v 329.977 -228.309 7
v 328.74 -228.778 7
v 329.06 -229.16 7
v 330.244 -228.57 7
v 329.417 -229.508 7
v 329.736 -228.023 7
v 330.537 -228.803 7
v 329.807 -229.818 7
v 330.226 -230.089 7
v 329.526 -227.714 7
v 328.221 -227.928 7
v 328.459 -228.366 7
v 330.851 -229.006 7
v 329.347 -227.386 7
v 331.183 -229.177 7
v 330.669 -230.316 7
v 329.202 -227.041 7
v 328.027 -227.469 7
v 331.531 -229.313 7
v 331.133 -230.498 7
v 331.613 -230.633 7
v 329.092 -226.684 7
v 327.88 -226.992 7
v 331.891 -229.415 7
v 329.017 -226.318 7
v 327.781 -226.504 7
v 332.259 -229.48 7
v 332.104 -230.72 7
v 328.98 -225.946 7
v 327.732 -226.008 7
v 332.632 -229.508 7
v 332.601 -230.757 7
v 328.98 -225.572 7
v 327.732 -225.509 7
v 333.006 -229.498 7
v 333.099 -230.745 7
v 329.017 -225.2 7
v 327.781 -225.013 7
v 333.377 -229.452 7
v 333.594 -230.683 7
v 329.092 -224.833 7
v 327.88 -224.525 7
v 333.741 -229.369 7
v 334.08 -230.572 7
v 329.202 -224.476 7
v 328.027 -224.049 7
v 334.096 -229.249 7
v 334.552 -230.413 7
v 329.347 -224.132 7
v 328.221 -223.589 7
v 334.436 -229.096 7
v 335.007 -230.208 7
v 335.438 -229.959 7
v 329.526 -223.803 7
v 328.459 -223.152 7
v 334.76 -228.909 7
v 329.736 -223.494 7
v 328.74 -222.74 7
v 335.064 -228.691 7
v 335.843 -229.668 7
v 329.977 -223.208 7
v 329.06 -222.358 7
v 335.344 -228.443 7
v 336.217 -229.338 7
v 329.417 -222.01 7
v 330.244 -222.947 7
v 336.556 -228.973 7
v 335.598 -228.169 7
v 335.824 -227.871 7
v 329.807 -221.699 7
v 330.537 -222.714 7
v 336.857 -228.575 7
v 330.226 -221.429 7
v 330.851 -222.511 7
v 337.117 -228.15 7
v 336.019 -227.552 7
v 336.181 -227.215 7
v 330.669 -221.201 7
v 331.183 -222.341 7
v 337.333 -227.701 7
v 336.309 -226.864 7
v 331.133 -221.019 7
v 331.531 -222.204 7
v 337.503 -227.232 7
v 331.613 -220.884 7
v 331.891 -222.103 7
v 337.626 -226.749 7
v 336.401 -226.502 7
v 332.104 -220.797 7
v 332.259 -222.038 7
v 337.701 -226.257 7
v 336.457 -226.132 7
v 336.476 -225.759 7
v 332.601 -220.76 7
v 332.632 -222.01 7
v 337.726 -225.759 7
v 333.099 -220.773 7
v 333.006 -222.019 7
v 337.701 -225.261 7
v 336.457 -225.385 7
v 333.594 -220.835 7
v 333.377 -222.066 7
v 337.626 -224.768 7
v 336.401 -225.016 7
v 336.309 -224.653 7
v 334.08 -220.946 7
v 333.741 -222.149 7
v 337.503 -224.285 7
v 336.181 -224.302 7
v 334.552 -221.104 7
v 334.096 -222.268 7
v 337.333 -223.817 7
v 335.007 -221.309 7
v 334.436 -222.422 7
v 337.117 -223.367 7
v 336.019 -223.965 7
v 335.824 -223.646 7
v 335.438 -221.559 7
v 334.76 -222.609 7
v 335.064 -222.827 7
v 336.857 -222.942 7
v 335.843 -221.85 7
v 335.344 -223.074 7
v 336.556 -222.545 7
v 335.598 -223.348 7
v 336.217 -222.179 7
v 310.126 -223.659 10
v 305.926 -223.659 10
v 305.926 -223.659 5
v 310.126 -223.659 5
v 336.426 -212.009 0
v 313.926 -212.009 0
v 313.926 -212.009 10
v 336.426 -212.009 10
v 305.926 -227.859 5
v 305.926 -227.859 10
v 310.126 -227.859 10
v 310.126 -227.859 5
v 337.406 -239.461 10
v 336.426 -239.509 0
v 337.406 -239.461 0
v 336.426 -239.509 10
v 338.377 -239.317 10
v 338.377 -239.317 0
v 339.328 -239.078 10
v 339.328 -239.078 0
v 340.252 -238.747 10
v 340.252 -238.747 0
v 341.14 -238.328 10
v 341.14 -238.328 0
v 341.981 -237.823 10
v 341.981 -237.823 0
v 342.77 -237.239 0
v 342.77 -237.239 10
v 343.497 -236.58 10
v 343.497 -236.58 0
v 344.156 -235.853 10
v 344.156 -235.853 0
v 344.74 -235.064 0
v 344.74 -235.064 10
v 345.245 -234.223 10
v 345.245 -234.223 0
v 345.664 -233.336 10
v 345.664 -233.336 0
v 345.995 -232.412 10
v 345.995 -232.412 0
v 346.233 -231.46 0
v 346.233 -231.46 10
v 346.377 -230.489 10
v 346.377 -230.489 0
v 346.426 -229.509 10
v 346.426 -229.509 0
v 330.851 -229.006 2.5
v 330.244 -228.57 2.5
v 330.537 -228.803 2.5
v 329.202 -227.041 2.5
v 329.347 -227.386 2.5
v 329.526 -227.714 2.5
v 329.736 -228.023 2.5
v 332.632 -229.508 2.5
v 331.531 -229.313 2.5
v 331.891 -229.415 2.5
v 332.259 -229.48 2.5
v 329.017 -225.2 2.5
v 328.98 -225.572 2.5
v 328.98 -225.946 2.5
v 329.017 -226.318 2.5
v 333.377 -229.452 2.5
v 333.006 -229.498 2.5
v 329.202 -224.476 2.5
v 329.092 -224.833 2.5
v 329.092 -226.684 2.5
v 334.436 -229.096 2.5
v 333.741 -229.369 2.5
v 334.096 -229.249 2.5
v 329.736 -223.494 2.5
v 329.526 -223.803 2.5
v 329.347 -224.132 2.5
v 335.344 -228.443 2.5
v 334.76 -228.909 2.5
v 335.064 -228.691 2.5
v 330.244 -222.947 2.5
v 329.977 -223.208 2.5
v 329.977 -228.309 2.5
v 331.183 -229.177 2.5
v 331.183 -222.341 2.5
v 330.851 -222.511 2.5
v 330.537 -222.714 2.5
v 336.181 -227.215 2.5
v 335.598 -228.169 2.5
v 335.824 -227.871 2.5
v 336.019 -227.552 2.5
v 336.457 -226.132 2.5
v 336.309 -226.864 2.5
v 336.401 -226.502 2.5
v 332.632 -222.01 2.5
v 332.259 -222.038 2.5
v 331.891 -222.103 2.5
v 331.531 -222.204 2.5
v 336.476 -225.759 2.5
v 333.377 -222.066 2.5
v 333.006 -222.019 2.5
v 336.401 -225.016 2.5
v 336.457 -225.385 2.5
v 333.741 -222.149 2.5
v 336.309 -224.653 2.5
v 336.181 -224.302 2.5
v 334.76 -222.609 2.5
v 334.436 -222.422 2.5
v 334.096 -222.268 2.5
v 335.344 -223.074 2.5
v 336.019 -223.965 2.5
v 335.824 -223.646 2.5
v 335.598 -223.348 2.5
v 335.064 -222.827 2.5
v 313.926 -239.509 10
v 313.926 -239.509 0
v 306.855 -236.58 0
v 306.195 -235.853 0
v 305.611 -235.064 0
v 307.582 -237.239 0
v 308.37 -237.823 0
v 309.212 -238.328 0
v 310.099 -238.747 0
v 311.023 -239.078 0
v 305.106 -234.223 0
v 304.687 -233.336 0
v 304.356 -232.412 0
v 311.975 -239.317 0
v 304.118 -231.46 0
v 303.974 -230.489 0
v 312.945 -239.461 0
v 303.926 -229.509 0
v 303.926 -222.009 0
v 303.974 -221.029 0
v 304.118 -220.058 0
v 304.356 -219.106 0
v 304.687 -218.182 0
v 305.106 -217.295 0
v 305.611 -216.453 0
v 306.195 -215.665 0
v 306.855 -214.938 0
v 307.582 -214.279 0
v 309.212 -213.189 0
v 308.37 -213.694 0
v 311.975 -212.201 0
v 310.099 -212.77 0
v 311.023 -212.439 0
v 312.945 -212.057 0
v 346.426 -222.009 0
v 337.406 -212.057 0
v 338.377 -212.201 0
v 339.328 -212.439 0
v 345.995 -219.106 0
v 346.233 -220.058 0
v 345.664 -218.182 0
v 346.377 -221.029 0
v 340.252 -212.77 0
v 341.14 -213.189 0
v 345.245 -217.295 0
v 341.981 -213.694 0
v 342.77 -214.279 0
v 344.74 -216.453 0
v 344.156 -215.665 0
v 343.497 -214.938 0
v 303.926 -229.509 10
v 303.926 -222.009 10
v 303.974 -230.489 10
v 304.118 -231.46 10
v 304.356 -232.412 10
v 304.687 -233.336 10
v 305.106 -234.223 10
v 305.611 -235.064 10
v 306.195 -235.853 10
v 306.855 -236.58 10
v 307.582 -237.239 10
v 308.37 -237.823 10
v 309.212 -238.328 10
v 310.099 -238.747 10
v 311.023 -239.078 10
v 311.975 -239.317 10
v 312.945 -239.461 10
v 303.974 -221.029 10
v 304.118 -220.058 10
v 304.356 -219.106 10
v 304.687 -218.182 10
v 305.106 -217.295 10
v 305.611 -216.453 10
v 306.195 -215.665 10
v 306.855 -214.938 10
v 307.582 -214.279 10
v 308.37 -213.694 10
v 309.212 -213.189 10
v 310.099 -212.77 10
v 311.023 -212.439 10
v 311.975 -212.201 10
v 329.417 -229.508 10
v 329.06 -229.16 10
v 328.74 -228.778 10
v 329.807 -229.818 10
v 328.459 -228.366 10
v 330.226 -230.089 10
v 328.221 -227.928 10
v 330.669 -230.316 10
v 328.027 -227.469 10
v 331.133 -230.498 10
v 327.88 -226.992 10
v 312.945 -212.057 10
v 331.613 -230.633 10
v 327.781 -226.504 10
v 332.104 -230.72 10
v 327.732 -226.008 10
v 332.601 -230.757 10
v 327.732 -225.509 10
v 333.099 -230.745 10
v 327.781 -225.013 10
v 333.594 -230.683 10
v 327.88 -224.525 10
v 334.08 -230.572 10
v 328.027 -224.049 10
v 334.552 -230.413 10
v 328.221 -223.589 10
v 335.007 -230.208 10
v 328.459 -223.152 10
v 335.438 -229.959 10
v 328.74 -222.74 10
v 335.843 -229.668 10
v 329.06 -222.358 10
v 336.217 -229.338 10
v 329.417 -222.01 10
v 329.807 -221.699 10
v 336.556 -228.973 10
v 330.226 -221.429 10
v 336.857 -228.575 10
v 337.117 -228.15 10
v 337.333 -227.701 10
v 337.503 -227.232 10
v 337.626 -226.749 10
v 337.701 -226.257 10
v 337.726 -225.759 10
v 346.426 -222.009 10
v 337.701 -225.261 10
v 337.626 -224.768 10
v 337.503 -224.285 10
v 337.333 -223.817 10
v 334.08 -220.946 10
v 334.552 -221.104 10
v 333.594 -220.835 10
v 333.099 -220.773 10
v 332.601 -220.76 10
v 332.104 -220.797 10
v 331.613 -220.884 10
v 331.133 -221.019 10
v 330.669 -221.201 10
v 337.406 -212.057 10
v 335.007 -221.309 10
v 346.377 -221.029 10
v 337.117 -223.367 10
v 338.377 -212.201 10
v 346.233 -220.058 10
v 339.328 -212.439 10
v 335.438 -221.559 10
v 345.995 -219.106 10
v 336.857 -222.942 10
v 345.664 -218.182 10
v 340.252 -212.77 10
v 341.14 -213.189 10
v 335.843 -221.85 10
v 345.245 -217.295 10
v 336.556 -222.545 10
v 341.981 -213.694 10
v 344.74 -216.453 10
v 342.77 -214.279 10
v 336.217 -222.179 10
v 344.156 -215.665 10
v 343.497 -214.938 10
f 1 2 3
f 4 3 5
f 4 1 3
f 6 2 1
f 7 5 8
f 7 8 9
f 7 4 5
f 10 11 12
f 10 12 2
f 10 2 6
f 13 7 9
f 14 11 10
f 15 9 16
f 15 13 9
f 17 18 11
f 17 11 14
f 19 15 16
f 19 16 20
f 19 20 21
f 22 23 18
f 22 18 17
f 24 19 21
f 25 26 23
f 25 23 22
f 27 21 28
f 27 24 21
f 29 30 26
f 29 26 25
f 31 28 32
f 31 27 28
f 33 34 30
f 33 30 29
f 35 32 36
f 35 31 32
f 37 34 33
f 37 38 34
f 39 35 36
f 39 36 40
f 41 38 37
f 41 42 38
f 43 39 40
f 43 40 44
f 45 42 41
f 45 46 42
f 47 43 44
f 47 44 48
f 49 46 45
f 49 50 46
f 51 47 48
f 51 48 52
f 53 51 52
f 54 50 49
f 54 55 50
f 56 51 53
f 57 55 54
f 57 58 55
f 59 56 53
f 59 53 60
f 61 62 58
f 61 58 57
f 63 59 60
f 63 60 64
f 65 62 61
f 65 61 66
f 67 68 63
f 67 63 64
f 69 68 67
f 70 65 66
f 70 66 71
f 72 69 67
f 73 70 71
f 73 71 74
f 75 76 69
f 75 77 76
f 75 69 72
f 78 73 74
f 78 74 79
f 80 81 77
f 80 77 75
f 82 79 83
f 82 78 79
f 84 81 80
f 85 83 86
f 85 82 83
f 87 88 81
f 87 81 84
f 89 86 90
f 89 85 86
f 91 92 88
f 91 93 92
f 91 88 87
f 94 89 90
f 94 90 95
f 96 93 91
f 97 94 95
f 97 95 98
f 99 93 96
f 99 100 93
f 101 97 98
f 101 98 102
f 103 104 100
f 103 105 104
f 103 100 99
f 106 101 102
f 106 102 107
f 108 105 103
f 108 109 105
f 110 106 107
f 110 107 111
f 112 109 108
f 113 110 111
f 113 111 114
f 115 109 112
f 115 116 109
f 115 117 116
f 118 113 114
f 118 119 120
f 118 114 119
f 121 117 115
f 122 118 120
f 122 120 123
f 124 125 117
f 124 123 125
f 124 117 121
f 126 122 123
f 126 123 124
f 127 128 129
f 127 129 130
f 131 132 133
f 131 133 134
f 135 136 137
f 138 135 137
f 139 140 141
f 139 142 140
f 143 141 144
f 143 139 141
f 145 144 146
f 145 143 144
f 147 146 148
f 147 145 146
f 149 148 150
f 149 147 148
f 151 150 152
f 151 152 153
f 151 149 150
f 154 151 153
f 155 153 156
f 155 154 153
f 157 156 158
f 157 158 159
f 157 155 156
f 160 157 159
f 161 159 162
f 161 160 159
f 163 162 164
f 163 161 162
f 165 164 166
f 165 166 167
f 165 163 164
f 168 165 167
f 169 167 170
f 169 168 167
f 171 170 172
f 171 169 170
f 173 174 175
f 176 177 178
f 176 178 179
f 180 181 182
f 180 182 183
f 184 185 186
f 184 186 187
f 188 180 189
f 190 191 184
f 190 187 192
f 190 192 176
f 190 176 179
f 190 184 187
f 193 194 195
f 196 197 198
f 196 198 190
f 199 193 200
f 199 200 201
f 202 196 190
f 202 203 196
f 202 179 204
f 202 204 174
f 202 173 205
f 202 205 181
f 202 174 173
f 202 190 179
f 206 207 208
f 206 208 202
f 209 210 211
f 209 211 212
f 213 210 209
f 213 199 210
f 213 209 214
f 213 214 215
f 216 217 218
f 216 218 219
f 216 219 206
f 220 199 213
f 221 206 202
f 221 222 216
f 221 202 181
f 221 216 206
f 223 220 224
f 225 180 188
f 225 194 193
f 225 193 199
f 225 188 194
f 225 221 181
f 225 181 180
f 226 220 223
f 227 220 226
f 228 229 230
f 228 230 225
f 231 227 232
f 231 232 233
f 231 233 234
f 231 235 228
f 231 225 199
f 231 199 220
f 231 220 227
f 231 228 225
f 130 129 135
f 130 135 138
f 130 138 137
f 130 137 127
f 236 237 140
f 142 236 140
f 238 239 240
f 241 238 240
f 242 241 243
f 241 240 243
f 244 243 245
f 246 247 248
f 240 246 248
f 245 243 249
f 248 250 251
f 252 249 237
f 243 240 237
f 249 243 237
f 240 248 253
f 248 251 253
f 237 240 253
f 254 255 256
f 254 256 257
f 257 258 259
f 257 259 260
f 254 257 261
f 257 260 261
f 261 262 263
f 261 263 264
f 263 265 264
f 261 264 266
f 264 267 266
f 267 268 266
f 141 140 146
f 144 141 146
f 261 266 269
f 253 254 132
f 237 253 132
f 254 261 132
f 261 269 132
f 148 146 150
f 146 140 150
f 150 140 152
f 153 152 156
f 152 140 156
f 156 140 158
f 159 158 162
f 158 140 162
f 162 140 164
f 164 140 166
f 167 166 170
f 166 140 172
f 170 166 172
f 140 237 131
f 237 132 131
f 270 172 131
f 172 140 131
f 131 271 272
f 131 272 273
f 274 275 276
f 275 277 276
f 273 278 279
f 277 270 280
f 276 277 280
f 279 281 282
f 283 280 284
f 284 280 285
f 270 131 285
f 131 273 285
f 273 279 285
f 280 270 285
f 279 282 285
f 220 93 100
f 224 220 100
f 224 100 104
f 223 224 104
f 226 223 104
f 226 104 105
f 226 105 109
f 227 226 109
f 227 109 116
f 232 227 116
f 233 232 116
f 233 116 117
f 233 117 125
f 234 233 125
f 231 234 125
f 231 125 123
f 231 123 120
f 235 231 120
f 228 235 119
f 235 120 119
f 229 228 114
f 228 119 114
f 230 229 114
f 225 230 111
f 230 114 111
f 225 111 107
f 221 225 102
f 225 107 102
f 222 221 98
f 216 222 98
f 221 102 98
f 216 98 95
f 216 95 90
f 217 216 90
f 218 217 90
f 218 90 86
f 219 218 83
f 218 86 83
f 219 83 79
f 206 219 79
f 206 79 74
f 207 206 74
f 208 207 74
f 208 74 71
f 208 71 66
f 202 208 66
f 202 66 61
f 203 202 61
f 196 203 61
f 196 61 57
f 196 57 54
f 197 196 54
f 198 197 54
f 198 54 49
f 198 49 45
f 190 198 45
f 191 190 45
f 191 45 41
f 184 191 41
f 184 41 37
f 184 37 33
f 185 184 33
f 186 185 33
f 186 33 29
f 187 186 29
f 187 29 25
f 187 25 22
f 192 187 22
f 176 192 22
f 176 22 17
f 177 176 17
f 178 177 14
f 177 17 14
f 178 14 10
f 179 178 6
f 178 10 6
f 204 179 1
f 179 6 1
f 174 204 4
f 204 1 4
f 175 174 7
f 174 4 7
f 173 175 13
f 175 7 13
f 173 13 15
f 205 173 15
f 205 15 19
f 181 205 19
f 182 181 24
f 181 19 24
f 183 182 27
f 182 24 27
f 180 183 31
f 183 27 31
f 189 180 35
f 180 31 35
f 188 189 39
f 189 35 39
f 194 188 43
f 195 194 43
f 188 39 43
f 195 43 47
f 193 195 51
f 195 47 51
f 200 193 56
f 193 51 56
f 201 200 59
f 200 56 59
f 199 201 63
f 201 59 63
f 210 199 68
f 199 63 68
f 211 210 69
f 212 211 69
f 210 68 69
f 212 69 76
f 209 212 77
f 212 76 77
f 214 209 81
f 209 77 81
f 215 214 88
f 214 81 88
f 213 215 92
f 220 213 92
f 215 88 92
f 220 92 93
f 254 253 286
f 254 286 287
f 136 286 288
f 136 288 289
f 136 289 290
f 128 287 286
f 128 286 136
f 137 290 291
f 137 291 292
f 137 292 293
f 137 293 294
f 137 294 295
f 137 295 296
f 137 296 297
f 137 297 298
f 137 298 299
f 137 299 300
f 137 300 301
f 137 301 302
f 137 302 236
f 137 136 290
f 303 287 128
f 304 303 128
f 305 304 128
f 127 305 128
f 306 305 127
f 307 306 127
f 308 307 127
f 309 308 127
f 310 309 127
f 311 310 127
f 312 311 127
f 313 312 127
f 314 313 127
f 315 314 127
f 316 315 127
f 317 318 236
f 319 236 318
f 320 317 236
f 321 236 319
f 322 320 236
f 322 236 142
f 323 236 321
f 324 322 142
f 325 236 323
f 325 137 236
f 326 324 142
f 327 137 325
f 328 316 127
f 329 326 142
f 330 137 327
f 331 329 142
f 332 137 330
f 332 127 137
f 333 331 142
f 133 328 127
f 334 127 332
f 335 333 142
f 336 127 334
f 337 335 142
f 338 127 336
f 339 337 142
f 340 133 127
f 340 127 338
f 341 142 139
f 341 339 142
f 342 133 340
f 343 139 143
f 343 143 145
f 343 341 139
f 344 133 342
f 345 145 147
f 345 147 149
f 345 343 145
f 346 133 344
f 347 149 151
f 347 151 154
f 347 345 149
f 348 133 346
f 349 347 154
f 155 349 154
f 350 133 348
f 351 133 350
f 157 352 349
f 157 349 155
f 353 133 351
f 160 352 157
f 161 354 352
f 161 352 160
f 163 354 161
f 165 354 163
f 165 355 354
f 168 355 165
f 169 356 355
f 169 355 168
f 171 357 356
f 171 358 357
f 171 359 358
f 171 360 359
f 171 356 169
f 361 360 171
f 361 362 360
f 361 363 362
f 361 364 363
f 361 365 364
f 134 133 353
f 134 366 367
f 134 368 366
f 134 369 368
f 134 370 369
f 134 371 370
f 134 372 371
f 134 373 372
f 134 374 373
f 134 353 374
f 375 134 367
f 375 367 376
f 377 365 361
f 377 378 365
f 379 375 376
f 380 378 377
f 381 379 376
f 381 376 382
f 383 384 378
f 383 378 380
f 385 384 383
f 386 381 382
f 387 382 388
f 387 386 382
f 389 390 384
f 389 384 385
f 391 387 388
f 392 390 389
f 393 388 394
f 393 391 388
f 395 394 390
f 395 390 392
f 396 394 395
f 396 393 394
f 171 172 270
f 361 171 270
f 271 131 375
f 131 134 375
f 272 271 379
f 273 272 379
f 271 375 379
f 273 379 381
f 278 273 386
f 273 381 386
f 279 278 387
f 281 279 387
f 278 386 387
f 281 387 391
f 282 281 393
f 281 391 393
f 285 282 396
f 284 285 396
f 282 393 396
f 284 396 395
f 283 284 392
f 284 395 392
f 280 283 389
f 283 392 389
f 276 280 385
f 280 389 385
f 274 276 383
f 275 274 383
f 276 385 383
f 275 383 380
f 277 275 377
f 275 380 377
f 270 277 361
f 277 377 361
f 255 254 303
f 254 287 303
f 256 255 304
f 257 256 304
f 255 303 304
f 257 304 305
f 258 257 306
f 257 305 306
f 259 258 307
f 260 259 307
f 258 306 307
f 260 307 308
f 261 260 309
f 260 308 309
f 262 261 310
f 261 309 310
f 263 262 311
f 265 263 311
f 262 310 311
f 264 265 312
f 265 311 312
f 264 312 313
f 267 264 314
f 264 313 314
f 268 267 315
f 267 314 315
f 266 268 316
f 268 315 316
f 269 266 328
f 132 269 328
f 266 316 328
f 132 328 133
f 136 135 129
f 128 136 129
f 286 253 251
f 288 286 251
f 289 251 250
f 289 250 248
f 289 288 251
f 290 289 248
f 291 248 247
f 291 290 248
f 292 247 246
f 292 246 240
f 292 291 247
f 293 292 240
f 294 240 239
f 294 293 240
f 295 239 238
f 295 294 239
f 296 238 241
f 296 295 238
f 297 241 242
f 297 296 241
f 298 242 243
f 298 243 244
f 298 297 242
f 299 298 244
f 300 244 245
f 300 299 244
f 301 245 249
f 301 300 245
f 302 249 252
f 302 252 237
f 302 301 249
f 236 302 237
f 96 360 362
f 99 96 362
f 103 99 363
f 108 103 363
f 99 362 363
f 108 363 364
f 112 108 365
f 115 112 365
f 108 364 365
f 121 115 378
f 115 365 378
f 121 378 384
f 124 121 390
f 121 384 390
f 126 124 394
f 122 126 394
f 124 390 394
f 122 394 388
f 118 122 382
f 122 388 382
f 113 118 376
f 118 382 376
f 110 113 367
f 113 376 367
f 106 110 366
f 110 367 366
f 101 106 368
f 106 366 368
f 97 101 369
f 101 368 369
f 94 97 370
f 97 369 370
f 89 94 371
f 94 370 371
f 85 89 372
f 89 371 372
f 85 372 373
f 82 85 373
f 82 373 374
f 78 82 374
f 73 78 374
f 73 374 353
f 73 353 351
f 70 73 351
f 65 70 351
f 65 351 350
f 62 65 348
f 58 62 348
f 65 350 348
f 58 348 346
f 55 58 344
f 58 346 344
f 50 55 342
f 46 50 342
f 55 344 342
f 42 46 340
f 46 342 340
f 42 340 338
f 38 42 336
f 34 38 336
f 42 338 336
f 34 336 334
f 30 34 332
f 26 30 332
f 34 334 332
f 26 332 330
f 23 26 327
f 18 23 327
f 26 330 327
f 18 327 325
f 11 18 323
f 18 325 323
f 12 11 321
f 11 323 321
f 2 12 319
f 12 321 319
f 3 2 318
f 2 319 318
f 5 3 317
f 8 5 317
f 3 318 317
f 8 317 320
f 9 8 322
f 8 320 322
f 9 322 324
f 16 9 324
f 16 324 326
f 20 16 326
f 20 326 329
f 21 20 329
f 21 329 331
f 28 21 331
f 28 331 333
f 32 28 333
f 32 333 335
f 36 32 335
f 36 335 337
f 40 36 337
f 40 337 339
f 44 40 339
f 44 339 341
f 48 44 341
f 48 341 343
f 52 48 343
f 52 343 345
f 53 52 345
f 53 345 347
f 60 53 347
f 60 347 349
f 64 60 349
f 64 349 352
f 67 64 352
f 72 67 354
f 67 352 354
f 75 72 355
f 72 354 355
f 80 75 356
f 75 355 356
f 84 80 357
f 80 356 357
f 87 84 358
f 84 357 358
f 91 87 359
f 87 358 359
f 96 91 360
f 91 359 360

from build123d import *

# Parameters (mm, degrees)
SKETCH1_W           = 42.5
SKETCH1_H           = 27.5
BOSS_EXTRUDE1_DEPTH = 10
SKETCH2_R           = 5
CUT_EXTRUDE1_DEPTH  = 3
SKETCH3_W           = 4.2
SKETCH3_H           = 4.2
CUT_EXTRUDE2_DEPTH  = 5
SKETCH4_R           = 3.75
CUT_EXTRUDE3_DEPTH  = 7.5
FILLET1_R           = 10


with BuildPart() as part:
    # Sketch1 → Boss-Extrude1 (new body)
    with BuildSketch(Plane.XY):
        with Locations((325.175597792, -225.758680099)):
            Rectangle(SKETCH1_W, SKETCH1_H)
    extrude(amount=BOSS_EXTRUDE1_DEPTH)

    # Sketch2 → Cut-Extrude1 (cut)
    with BuildSketch(Plane.XY.offset(10)):
        with Locations((332.725597792, -225.758680099)):
            Circle(SKETCH2_R)
    extrude(amount=-CUT_EXTRUDE1_DEPTH, mode=Mode.SUBTRACT)

    # Sketch3 → Cut-Extrude2 (cut)
    with BuildSketch(Plane.XY.offset(10)):
        with Locations((308.025597792, -225.758680099)):
            Rectangle(SKETCH3_W, SKETCH3_H)
    extrude(amount=-CUT_EXTRUDE2_DEPTH, mode=Mode.SUBTRACT)

    # Sketch4 → Cut-Extrude3 (cut)
    with BuildSketch(Plane.XY.offset(10)):
        with Locations((332.725597792, -225.758680099)):
            Circle(SKETCH4_R)
    extrude(amount=-CUT_EXTRUDE3_DEPTH, mode=Mode.SUBTRACT)

    # Fillet1
    fillet1_edges = [part.edges().sort_by_distance(p)[0] for p in [
        (303.925597792, -212.008680099, 5),
        (303.925597792, -239.508680099, 5),
        (346.425597792, -239.508680099, 5),
        (346.425597792, -212.008680099, 5),
    ]]
    fillet(fillet1_edges, radius=FILLET1_R)


solid = part.part
